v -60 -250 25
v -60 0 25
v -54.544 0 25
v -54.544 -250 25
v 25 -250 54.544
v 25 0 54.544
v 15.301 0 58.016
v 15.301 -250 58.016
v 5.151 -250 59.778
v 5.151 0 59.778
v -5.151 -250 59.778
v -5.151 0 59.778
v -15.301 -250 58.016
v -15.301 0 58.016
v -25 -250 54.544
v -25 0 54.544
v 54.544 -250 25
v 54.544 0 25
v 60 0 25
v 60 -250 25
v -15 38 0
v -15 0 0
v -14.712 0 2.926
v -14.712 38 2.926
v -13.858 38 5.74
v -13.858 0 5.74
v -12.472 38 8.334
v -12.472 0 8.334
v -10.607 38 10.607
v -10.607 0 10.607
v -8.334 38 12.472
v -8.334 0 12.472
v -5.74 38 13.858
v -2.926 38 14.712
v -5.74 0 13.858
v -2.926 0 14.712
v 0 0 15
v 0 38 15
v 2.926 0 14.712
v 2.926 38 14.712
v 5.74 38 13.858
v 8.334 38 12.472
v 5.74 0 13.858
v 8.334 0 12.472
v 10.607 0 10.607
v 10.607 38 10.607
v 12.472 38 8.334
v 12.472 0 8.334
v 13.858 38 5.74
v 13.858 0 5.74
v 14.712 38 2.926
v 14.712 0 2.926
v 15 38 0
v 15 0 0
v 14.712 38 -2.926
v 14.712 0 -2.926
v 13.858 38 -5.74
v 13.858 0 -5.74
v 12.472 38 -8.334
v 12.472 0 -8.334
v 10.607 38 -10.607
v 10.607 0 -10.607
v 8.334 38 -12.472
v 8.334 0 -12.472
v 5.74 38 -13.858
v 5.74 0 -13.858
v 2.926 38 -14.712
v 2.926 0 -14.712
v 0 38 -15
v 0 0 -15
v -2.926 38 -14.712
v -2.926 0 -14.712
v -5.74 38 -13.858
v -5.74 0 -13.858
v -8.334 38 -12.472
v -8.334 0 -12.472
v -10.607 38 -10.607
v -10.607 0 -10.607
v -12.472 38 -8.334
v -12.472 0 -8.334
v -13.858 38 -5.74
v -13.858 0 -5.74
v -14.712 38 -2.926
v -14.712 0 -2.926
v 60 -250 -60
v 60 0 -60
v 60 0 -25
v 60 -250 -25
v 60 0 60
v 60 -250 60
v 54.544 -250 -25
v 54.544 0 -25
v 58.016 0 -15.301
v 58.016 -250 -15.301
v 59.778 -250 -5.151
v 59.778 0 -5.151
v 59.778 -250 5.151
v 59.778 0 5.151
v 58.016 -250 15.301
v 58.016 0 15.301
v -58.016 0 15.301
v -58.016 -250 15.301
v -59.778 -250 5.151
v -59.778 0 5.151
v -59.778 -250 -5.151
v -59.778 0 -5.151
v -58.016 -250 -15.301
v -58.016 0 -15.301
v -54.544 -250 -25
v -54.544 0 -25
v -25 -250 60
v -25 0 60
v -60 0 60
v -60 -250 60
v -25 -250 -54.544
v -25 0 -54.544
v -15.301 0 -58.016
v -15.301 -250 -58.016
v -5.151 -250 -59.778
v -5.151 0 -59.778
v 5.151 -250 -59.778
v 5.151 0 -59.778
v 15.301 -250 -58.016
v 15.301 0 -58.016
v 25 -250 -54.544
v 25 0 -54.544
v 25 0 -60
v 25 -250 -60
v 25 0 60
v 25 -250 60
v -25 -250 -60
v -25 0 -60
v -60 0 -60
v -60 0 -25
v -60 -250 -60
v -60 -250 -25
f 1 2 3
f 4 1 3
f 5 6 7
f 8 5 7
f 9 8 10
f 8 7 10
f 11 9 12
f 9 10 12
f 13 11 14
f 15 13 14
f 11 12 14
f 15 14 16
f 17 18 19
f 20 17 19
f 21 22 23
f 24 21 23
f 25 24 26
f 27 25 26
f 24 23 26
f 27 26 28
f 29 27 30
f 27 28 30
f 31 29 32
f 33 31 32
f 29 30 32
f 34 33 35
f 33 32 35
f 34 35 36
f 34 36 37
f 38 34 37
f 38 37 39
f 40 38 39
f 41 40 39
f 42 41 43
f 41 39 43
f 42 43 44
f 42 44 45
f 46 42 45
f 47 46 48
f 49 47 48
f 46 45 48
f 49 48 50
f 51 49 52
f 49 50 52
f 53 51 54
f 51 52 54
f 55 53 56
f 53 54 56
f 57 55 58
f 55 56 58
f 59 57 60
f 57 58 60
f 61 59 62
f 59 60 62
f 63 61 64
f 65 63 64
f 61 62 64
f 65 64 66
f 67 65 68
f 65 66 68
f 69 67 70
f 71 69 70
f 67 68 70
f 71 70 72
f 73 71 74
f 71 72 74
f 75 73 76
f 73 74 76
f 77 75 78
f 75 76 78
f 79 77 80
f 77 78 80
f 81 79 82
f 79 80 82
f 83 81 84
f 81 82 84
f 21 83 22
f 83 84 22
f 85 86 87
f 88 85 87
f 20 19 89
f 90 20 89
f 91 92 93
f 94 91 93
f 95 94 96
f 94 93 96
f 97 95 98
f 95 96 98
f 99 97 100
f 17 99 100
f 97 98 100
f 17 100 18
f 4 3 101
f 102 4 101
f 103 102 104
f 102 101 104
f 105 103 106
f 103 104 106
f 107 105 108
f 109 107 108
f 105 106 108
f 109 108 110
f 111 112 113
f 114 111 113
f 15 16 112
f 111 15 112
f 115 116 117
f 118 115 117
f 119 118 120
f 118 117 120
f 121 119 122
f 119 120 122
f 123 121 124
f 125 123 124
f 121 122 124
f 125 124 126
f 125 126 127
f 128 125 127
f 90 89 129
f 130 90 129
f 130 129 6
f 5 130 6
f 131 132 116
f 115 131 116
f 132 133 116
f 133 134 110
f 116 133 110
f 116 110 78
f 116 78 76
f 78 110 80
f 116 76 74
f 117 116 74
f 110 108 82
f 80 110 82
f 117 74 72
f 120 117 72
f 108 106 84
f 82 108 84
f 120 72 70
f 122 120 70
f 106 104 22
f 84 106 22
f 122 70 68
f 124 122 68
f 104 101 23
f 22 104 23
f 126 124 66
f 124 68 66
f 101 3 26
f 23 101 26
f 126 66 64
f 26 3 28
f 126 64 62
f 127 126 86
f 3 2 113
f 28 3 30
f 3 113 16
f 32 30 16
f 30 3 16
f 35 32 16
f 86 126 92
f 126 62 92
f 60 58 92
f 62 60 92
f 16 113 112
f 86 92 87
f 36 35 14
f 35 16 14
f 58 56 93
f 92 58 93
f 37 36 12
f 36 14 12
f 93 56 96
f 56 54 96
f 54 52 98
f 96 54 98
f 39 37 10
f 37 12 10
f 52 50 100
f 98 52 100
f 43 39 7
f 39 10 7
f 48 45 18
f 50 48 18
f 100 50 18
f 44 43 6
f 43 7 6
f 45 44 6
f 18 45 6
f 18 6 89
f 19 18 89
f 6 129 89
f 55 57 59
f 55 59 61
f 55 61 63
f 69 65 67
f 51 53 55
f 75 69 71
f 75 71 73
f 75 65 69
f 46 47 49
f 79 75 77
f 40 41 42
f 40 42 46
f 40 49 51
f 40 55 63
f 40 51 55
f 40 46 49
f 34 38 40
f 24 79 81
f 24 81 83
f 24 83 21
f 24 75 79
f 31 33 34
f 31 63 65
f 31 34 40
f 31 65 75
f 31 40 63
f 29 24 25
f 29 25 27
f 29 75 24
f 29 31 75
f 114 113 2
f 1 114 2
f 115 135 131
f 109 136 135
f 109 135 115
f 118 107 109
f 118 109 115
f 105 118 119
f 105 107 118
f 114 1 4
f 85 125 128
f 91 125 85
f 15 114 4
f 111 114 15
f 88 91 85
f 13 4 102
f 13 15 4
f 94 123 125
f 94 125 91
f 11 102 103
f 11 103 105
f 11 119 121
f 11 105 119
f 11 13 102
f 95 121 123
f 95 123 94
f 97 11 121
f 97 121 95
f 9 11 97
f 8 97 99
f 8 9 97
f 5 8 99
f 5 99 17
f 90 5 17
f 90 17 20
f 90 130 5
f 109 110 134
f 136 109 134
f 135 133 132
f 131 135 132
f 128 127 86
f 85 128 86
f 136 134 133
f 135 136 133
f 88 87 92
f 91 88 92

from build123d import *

# Parameters (mm, degrees)
F1_DEPTH = 250
F2_R     = 15
F3_DEPTH = 38


with BuildPart() as f1:
    # F0 (on Front) → F1 (new body)
    with BuildSketch(Plane.XZ):
        with BuildLine():
            Line((-60, 25), (-54.543561, 25))
            ThreePointArc((-54.543561, 25), (-60, 0), (-54.543561, -25))
            Line((-54.543561, -25), (-60, -25))
            Line((-60, -25), (-60, -60))
            Line((-60, -60), (-25, -60))
            Line((-25, -60), (-25, -54.543561))
            ThreePointArc((-25, -54.543561), (0, -60), (25, -54.543561))
            Line((25, -54.543561), (25, -60))
            Line((25, -60), (60, -60))
            Line((60, -60), (60, -25))
            Line((60, -25), (54.543561, -25))
            ThreePointArc((54.543561, -25), (60, 0), (54.543561, 25))
            Line((54.543561, 25), (60, 25))
            Line((60, 25), (60, 60))
            Line((60, 60), (25, 60))
            Line((25, 60), (25, 54.543561))
            ThreePointArc((25, 54.543561), (0, 60), (-25, 54.543561))
            Line((-25, 54.543561), (-25, 60))
            Line((-25, 60), (-60, 60))
            Line((-60, 60), (-60, 25))
        make_face()
    extrude(amount=F1_DEPTH)

    # F2 (on face) → F3 (join)
    with BuildSketch(Plane(origin=(0, 0, 0), x_dir=(-1, 0, 0), z_dir=(0, 1, 0))):
        Circle(F2_R)
    extrude(amount=F3_DEPTH)


solid = f1.part
